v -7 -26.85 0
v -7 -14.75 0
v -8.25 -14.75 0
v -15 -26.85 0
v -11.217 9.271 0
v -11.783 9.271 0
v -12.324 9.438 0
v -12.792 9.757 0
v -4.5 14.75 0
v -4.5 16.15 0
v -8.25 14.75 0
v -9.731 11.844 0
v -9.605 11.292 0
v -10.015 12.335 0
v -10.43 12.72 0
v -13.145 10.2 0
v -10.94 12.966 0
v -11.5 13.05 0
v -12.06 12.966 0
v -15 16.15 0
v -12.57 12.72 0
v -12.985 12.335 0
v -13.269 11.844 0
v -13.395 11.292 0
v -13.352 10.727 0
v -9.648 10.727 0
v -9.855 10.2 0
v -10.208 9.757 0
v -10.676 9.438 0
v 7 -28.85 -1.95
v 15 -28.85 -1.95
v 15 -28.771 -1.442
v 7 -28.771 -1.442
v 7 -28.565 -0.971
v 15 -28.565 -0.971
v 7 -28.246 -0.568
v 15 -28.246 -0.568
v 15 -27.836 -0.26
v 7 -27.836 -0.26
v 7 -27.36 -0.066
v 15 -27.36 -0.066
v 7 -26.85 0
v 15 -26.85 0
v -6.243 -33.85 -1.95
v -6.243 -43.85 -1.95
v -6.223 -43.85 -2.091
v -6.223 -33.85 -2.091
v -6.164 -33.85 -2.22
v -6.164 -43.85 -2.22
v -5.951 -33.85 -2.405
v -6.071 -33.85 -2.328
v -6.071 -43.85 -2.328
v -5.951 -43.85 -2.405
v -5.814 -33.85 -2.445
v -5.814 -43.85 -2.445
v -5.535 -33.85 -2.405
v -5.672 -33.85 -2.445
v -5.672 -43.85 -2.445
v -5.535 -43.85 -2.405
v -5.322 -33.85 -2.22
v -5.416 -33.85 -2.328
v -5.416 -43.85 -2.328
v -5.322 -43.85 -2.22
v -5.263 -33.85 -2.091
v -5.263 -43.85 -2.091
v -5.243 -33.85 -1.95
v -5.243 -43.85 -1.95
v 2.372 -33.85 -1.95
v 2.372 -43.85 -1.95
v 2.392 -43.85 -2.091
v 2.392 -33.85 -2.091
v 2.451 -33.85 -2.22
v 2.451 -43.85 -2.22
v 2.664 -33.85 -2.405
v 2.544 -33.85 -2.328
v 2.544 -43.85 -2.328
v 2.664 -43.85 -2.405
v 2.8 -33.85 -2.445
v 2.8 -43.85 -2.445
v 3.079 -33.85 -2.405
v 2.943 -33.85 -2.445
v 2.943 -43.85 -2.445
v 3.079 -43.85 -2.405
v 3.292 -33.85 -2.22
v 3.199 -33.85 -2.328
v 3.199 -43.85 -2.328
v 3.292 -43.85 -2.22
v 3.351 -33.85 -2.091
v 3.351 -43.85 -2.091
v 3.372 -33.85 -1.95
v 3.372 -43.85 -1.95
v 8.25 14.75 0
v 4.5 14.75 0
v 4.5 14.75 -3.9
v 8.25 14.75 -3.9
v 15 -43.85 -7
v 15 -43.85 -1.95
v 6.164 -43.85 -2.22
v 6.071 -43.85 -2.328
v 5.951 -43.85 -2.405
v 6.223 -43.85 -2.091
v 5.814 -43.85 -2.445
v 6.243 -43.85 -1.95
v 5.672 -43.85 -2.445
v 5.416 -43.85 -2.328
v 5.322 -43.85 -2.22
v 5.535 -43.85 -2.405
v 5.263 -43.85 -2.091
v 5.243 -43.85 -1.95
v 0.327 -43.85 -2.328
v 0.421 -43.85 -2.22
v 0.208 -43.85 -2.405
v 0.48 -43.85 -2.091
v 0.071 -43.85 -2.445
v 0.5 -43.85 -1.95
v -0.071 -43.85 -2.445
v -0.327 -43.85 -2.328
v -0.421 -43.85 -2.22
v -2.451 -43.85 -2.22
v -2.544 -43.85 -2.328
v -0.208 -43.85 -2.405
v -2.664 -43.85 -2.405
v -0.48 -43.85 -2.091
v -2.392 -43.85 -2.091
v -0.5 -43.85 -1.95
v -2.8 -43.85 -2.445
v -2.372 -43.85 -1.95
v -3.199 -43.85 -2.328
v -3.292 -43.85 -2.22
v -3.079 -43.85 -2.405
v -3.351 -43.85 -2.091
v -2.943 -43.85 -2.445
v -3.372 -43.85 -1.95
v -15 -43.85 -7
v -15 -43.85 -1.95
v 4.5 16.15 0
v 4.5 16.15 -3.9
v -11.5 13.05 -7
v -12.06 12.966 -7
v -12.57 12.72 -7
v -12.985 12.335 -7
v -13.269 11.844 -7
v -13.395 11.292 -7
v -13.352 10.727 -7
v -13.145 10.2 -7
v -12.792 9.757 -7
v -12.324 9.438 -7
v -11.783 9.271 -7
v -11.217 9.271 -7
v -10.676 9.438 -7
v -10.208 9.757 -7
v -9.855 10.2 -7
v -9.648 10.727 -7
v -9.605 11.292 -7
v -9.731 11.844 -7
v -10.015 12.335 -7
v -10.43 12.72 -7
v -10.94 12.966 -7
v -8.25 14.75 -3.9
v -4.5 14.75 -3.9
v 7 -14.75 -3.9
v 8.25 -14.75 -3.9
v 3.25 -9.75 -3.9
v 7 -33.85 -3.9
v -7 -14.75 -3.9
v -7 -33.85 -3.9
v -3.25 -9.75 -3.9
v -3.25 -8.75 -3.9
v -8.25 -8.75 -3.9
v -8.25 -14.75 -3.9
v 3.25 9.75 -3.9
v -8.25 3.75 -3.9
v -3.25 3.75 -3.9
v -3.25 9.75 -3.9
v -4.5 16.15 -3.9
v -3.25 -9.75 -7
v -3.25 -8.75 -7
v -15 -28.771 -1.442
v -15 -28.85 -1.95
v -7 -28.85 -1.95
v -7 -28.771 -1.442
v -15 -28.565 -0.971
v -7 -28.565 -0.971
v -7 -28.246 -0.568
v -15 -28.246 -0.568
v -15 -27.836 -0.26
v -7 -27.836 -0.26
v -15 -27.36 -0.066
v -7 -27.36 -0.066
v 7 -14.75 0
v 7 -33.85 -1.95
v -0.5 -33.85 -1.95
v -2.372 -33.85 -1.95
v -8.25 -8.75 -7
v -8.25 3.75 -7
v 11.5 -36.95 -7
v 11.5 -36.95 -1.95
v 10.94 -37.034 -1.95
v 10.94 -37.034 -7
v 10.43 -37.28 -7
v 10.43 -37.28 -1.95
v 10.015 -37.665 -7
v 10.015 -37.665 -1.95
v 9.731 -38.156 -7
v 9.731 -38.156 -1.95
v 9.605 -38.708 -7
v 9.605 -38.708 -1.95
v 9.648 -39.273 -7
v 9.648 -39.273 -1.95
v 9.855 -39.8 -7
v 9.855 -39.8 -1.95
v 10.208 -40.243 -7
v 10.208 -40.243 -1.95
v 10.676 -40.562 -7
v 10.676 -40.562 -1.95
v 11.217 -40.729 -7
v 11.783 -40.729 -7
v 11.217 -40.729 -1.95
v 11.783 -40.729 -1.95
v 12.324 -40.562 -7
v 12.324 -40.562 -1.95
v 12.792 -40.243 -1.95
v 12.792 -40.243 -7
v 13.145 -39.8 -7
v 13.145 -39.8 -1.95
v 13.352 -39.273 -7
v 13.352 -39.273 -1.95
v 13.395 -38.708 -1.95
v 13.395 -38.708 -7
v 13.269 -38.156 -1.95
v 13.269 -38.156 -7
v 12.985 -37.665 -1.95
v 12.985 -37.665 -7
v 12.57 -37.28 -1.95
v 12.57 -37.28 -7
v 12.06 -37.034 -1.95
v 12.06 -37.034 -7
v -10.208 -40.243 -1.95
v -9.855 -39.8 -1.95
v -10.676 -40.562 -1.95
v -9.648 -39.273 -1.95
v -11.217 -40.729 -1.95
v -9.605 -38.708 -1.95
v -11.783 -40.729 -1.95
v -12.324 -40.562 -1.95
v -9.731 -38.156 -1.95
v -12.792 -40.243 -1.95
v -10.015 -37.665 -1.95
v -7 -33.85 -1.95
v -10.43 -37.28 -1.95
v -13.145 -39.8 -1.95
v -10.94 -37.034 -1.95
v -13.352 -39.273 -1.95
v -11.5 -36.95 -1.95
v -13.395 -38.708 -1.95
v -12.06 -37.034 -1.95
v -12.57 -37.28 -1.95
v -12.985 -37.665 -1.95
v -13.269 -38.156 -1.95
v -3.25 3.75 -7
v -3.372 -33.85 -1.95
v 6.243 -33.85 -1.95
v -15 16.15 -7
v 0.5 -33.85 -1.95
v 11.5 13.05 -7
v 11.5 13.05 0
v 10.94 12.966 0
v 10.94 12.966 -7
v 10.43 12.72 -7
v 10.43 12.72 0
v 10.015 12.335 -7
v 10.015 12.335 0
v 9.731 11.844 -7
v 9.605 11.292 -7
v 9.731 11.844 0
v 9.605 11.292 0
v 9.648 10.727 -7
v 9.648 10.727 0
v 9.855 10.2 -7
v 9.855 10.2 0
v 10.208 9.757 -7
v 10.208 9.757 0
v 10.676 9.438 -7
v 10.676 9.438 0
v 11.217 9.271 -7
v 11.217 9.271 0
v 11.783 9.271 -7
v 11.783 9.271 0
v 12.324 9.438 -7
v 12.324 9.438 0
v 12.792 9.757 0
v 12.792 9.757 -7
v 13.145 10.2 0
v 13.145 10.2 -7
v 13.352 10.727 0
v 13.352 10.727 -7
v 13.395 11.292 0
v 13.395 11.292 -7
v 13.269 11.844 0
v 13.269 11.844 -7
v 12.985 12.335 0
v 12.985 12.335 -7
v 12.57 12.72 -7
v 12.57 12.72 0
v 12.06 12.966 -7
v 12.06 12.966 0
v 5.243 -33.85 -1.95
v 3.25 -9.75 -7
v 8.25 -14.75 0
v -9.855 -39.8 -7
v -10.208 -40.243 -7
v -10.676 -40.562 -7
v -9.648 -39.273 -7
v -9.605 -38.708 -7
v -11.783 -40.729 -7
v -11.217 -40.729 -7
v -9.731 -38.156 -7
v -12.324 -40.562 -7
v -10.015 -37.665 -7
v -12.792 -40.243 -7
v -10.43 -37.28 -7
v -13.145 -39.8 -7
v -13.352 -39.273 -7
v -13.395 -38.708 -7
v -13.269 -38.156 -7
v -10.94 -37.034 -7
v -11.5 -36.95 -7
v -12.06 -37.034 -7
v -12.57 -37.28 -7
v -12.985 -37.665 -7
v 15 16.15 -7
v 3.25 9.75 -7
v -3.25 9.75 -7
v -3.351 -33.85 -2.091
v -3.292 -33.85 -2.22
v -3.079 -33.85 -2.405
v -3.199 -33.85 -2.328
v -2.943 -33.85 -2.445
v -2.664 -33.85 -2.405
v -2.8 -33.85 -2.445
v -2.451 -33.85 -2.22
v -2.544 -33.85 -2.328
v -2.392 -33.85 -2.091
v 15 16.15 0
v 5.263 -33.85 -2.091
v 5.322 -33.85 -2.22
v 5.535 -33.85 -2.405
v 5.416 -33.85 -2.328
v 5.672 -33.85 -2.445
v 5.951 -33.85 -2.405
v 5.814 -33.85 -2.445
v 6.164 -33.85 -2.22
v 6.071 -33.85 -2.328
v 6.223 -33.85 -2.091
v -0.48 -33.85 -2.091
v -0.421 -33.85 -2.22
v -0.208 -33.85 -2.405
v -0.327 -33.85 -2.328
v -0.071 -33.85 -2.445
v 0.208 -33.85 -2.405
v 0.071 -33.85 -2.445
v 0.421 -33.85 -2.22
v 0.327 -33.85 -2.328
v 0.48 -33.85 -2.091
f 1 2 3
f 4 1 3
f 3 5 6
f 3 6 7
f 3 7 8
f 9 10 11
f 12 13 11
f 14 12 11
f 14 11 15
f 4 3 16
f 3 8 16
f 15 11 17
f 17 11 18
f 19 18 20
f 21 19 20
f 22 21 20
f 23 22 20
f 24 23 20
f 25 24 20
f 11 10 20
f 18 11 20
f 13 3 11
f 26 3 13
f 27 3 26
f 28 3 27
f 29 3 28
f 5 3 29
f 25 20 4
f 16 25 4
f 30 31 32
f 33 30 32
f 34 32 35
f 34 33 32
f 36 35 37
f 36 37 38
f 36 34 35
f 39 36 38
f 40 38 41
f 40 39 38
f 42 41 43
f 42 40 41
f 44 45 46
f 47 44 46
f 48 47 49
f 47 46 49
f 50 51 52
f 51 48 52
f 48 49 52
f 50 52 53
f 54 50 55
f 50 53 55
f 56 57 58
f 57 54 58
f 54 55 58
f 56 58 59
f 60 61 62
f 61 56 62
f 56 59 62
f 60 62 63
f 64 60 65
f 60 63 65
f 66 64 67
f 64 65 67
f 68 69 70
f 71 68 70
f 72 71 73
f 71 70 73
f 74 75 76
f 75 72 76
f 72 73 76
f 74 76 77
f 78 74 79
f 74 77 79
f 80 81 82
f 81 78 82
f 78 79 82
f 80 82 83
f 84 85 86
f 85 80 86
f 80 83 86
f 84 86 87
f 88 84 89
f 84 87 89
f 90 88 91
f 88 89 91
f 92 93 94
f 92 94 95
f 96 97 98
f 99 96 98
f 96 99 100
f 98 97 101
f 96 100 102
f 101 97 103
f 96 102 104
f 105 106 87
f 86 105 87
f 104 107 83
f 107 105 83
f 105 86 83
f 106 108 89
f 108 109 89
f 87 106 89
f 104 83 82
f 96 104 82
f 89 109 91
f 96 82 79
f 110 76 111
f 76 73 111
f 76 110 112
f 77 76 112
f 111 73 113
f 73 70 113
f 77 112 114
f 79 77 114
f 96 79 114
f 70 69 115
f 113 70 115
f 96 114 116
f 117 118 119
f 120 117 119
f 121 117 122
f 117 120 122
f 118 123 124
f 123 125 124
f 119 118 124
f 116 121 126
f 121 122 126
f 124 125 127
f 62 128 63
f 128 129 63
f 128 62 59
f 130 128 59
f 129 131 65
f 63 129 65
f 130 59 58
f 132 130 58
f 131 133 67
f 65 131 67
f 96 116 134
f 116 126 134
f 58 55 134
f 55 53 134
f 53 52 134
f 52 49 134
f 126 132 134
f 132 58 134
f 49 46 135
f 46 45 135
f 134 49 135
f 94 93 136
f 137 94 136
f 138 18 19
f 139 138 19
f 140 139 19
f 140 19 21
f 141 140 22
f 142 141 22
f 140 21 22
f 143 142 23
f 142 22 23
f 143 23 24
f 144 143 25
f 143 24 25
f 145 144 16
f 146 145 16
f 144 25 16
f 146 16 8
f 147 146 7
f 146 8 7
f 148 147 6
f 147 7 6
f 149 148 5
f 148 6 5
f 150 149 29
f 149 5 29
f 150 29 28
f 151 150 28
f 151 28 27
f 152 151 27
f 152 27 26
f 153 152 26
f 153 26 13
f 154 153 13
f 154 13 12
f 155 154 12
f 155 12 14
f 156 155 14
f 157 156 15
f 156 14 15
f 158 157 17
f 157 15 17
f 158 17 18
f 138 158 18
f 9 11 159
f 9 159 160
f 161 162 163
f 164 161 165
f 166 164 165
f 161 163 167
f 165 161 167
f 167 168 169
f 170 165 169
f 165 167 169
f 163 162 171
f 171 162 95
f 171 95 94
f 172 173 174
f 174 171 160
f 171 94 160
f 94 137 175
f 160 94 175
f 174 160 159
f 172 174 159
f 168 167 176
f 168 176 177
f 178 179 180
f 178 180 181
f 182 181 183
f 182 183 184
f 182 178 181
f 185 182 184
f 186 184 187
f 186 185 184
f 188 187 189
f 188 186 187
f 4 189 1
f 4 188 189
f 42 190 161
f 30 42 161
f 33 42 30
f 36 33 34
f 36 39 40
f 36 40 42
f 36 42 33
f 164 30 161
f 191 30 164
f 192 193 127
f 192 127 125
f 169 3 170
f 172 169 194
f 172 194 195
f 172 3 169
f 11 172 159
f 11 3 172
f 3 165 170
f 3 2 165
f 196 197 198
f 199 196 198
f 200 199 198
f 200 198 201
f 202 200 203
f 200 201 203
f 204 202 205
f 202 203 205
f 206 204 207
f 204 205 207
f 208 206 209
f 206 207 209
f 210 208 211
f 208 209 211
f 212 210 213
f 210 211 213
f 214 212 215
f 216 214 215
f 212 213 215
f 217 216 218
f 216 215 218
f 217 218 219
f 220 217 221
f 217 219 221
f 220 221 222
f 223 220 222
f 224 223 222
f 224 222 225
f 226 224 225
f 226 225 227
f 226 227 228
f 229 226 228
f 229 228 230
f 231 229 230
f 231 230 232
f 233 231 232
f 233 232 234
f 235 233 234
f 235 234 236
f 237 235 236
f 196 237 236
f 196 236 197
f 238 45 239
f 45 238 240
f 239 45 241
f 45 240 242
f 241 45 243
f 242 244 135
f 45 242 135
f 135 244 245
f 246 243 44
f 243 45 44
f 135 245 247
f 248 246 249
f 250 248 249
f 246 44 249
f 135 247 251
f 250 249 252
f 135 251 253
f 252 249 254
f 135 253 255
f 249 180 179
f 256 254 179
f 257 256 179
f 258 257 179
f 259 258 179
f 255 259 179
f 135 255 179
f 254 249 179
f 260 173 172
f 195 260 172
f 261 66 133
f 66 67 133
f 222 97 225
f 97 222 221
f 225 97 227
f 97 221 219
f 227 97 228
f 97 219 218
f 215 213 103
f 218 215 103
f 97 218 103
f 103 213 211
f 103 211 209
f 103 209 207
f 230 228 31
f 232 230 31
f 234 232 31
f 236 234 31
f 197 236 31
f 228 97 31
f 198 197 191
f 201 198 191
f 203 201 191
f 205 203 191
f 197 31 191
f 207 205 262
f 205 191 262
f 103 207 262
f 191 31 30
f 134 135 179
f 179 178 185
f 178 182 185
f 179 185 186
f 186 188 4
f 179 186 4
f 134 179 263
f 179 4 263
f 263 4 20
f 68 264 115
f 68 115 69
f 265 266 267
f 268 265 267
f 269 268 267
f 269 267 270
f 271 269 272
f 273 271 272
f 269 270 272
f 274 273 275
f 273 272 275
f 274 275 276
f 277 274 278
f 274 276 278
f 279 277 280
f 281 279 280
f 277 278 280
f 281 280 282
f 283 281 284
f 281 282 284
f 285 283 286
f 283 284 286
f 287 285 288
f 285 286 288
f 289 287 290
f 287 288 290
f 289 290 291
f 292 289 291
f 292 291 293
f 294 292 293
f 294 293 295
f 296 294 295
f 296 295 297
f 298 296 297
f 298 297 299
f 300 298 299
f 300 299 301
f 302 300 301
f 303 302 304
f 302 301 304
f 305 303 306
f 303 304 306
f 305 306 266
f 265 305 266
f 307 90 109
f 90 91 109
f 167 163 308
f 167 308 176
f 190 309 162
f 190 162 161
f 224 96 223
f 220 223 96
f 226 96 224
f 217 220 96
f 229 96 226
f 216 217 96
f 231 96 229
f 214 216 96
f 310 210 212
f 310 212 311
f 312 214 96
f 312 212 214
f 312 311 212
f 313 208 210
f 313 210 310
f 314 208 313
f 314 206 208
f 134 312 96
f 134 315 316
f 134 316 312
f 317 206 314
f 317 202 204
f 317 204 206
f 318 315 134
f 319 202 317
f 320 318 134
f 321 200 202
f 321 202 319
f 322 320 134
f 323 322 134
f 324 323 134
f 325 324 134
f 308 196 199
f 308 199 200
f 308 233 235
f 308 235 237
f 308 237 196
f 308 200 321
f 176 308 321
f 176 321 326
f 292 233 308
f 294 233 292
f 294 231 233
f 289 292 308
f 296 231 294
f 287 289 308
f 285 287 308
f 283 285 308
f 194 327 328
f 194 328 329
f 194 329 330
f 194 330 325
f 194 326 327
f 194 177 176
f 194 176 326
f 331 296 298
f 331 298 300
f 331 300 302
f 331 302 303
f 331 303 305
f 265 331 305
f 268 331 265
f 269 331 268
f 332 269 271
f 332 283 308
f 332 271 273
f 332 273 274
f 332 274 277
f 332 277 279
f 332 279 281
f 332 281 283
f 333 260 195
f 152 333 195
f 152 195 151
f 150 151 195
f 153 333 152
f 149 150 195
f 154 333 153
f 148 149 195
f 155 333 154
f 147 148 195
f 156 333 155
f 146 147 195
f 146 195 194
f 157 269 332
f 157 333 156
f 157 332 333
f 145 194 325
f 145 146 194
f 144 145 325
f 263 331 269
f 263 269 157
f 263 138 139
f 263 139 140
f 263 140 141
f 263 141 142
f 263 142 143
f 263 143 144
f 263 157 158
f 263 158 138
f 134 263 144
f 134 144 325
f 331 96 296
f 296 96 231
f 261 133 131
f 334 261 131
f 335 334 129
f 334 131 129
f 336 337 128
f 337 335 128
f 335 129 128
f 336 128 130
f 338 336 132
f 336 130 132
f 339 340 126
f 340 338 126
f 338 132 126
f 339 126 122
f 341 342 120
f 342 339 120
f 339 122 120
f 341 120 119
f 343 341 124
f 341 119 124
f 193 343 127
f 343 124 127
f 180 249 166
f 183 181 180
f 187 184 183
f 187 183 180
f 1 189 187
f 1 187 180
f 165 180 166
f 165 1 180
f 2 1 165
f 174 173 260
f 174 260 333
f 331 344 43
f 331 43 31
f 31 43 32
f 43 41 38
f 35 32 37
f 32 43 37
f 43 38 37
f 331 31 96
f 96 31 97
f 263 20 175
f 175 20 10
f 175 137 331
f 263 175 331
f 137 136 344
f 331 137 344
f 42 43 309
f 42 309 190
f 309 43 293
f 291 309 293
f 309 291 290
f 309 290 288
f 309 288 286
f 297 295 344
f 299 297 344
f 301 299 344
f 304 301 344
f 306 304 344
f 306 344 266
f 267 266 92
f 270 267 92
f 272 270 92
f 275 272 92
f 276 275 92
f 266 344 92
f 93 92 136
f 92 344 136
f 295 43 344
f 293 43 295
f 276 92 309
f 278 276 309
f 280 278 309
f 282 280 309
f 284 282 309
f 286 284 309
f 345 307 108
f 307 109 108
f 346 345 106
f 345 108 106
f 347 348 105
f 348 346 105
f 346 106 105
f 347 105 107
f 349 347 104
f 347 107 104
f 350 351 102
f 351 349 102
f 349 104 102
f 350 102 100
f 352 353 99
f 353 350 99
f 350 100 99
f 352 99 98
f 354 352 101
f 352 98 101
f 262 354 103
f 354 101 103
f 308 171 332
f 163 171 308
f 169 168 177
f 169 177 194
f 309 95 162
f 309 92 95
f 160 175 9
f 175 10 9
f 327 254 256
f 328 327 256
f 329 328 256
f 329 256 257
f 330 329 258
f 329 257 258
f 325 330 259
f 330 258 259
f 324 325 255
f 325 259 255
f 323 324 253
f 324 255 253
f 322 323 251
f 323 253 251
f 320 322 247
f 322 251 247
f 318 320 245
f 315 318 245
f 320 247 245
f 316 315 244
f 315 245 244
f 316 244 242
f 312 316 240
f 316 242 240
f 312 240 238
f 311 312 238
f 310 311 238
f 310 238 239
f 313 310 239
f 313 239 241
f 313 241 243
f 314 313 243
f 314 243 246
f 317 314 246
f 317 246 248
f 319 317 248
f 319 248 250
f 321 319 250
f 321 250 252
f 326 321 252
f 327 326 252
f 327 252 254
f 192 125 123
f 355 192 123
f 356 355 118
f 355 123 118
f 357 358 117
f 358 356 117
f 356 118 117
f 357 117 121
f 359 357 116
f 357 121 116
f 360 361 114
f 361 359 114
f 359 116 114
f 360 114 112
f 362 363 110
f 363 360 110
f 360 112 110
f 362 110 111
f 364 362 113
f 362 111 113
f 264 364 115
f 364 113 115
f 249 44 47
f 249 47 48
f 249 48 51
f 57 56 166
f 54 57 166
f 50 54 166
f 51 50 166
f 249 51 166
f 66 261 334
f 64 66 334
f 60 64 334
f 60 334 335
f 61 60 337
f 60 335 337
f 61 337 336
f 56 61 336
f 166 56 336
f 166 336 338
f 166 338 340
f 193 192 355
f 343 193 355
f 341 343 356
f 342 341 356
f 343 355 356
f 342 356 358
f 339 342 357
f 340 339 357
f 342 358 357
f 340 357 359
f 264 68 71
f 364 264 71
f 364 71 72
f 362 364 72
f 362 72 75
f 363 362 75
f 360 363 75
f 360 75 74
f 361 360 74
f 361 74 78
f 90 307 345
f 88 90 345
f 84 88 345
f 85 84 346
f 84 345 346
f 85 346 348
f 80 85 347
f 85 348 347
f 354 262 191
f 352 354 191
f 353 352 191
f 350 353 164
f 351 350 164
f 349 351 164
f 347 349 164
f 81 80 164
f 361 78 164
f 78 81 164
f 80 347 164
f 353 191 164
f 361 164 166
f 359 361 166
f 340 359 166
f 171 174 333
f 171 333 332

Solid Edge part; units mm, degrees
sketch "Sketch1" plane through (0, 0, 0) normal (0, 0, 1) x (1, 0, 0)
  line L0 (-15, -43.85) -> (-15, 16.15)
  line L1 (-15, 16.15) -> (15, 16.15)
  line L2 (15, 16.15) -> (15, -43.85)
  line L3 (15, -43.85) -> (-15, -43.85)
extrude "Protrusion1" add sketch "Sketch1" against normal blind 7
sketch "Sketch2" plane through (0, 0, 0) normal (0, 0, 1) x (1, 0, 0)
  line L0 (8.25, -14.75) -> (-8.25, -14.75)
  line L1 (-8.25, -14.75) -> (-8.25, 14.75)
  line L2 (-8.25, 14.75) -> (8.25, 14.75)
  line L3 (8.25, 14.75) -> (8.25, -14.75)
extrude "ExtrudedCutout_1" cut sketch "Sketch2" against normal blind 3.9
sketch "Sketch3" plane through (0, -13.85, 0) normal (0, 0, 1) x (1, 0, 0)
  line L0 (3.25, 4.1) -> (-3.25, 4.1)
  line L1 (-3.25, 4.1) -> (-3.25, 5.1)
  line L2 (-3.25, 5.1) -> (-8.25, 5.1)
  line L3 (-8.25, 5.1) -> (-8.25, 17.6)
  line L4 (-3.25, 17.6) -> (-8.25, 17.6)
  line L5 (-3.25, 17.6) -> (-3.25, 23.6)
  line L6 (-3.25, 23.6) -> (3.25, 23.6)
  line L7 (3.25, 23.6) -> (3.25, 4.1)
extrude "Cutout1" cut sketch "Sketch3" against normal up to next
sketch "Sketch4" plane through (0, -13.85, 0) normal (0, 0, 1) x (1, 0, 0)
  line L0 (4.5, 31.4) -> (-4.5, 31.4)
  line L1 (-4.5, 31.4) -> (-4.5, 28.6)
  line L2 (-4.5, 28.6) -> (4.5, 28.6)
  line L3 (4.5, 28.6) -> (4.5, 31.4)
extrude "Cutout2" cut sketch "Sketch4" against normal up to vertex (3.9 mm away)
sketch "Sketch5" plane through (0, -13.85, 0) normal (0, 0, 1) x (1, 0, 0)
  line L0 (7, -4.1577) -> (7, -30)
  line L1 (7, -30) -> (-7, -30)
  line L2 (-7, -30) -> (-7, -4.1577)
  line L3 (-7, -4.1577) -> (-7, -0.9)
  line L4 (-7, -0.9) -> (7, -0.9)
  line L5 (7, -0.9) -> (7, -4.1577)
extrude "Cutout3" cut sketch "Sketch5" against normal up to vertex (3.9 mm away)
sketch "Sketch6" plane through (0, -43.85, -3.5) normal (0, -1, 0) x (1, 0, 0)
  line L0 (-6.2431, 1.55) -> (-7, 1.55)
  line L1 (-7, 1.55) -> (-7, -0.4)
  line L2 (-7, -0.4) -> (7, -0.4)
  line L3 (7, -0.4) -> (7, 1.55)
  line L4 (6.2431, 1.55) -> (7, 1.55)
  line L5 (3.3715, 1.55) -> (5.2431, 1.55)
  line L6 (0.5, 1.55) -> (2.3715, 1.55)
  line L7 (-2.3715, 1.55) -> (-0.5, 1.55)
  line L8 (-5.2431, 1.55) -> (-3.3715, 1.55)
  arc A0 (6.2431, 1.55) -> (5.2431, 1.55) centre (5.7431, 1.55) cw
  arc A1 (3.3715, 1.55) -> (2.3715, 1.55) centre (2.8715, 1.55) cw
  arc A2 (0.5, 1.55) -> (-0.5, 1.55) centre (0, 1.55) cw
  arc A3 (-2.3715, 1.55) -> (-3.3715, 1.55) centre (-2.8715, 1.55) cw
  arc A4 (-5.2431, 1.55) -> (-6.2431, 1.55) centre (-5.7431, 1.55) cw
extrude "ExtrudedProtrusion_2" add sketch "Sketch6" against normal blind 10
sketch "Sketch7" plane through (-8.9522, -13.85, 0) normal (0, 0, 1) x (0, 1, 0)
  circle A0 centre (-25, 2.5478) radius 1.9
  circle A1 centre (-25, -20.4522) radius 1.9
  circle A2 centre (25, 2.5478) radius 1.9
  circle A3 centre (25, -20.4522) radius 1.9
  dimension "D1" = 23
  dimension "D2" = 50
extrude "Cutout4" cut sketch "Sketch7" against normal up to next
sketch "Sketch8" plane through (9.75, -13.85, 0) normal (0, 0, 1) x (0, 1, 0)
  line L0 (-15, 24.75) -> (-15, -5.25)
  line L1 (-15, -5.25) -> (-30, -5.25)
  line L2 (-30, -5.25) -> (-30, 24.75)
  line L3 (-30, 24.75) -> (-15, 24.75)
extrude "Cutout5" cut sketch "Sketch8" against normal up to vertex (1.95 mm away)
fillet "Round_1" radius 2 2 edges at (-11, -28.85, 0) (11, -28.85, 0)
